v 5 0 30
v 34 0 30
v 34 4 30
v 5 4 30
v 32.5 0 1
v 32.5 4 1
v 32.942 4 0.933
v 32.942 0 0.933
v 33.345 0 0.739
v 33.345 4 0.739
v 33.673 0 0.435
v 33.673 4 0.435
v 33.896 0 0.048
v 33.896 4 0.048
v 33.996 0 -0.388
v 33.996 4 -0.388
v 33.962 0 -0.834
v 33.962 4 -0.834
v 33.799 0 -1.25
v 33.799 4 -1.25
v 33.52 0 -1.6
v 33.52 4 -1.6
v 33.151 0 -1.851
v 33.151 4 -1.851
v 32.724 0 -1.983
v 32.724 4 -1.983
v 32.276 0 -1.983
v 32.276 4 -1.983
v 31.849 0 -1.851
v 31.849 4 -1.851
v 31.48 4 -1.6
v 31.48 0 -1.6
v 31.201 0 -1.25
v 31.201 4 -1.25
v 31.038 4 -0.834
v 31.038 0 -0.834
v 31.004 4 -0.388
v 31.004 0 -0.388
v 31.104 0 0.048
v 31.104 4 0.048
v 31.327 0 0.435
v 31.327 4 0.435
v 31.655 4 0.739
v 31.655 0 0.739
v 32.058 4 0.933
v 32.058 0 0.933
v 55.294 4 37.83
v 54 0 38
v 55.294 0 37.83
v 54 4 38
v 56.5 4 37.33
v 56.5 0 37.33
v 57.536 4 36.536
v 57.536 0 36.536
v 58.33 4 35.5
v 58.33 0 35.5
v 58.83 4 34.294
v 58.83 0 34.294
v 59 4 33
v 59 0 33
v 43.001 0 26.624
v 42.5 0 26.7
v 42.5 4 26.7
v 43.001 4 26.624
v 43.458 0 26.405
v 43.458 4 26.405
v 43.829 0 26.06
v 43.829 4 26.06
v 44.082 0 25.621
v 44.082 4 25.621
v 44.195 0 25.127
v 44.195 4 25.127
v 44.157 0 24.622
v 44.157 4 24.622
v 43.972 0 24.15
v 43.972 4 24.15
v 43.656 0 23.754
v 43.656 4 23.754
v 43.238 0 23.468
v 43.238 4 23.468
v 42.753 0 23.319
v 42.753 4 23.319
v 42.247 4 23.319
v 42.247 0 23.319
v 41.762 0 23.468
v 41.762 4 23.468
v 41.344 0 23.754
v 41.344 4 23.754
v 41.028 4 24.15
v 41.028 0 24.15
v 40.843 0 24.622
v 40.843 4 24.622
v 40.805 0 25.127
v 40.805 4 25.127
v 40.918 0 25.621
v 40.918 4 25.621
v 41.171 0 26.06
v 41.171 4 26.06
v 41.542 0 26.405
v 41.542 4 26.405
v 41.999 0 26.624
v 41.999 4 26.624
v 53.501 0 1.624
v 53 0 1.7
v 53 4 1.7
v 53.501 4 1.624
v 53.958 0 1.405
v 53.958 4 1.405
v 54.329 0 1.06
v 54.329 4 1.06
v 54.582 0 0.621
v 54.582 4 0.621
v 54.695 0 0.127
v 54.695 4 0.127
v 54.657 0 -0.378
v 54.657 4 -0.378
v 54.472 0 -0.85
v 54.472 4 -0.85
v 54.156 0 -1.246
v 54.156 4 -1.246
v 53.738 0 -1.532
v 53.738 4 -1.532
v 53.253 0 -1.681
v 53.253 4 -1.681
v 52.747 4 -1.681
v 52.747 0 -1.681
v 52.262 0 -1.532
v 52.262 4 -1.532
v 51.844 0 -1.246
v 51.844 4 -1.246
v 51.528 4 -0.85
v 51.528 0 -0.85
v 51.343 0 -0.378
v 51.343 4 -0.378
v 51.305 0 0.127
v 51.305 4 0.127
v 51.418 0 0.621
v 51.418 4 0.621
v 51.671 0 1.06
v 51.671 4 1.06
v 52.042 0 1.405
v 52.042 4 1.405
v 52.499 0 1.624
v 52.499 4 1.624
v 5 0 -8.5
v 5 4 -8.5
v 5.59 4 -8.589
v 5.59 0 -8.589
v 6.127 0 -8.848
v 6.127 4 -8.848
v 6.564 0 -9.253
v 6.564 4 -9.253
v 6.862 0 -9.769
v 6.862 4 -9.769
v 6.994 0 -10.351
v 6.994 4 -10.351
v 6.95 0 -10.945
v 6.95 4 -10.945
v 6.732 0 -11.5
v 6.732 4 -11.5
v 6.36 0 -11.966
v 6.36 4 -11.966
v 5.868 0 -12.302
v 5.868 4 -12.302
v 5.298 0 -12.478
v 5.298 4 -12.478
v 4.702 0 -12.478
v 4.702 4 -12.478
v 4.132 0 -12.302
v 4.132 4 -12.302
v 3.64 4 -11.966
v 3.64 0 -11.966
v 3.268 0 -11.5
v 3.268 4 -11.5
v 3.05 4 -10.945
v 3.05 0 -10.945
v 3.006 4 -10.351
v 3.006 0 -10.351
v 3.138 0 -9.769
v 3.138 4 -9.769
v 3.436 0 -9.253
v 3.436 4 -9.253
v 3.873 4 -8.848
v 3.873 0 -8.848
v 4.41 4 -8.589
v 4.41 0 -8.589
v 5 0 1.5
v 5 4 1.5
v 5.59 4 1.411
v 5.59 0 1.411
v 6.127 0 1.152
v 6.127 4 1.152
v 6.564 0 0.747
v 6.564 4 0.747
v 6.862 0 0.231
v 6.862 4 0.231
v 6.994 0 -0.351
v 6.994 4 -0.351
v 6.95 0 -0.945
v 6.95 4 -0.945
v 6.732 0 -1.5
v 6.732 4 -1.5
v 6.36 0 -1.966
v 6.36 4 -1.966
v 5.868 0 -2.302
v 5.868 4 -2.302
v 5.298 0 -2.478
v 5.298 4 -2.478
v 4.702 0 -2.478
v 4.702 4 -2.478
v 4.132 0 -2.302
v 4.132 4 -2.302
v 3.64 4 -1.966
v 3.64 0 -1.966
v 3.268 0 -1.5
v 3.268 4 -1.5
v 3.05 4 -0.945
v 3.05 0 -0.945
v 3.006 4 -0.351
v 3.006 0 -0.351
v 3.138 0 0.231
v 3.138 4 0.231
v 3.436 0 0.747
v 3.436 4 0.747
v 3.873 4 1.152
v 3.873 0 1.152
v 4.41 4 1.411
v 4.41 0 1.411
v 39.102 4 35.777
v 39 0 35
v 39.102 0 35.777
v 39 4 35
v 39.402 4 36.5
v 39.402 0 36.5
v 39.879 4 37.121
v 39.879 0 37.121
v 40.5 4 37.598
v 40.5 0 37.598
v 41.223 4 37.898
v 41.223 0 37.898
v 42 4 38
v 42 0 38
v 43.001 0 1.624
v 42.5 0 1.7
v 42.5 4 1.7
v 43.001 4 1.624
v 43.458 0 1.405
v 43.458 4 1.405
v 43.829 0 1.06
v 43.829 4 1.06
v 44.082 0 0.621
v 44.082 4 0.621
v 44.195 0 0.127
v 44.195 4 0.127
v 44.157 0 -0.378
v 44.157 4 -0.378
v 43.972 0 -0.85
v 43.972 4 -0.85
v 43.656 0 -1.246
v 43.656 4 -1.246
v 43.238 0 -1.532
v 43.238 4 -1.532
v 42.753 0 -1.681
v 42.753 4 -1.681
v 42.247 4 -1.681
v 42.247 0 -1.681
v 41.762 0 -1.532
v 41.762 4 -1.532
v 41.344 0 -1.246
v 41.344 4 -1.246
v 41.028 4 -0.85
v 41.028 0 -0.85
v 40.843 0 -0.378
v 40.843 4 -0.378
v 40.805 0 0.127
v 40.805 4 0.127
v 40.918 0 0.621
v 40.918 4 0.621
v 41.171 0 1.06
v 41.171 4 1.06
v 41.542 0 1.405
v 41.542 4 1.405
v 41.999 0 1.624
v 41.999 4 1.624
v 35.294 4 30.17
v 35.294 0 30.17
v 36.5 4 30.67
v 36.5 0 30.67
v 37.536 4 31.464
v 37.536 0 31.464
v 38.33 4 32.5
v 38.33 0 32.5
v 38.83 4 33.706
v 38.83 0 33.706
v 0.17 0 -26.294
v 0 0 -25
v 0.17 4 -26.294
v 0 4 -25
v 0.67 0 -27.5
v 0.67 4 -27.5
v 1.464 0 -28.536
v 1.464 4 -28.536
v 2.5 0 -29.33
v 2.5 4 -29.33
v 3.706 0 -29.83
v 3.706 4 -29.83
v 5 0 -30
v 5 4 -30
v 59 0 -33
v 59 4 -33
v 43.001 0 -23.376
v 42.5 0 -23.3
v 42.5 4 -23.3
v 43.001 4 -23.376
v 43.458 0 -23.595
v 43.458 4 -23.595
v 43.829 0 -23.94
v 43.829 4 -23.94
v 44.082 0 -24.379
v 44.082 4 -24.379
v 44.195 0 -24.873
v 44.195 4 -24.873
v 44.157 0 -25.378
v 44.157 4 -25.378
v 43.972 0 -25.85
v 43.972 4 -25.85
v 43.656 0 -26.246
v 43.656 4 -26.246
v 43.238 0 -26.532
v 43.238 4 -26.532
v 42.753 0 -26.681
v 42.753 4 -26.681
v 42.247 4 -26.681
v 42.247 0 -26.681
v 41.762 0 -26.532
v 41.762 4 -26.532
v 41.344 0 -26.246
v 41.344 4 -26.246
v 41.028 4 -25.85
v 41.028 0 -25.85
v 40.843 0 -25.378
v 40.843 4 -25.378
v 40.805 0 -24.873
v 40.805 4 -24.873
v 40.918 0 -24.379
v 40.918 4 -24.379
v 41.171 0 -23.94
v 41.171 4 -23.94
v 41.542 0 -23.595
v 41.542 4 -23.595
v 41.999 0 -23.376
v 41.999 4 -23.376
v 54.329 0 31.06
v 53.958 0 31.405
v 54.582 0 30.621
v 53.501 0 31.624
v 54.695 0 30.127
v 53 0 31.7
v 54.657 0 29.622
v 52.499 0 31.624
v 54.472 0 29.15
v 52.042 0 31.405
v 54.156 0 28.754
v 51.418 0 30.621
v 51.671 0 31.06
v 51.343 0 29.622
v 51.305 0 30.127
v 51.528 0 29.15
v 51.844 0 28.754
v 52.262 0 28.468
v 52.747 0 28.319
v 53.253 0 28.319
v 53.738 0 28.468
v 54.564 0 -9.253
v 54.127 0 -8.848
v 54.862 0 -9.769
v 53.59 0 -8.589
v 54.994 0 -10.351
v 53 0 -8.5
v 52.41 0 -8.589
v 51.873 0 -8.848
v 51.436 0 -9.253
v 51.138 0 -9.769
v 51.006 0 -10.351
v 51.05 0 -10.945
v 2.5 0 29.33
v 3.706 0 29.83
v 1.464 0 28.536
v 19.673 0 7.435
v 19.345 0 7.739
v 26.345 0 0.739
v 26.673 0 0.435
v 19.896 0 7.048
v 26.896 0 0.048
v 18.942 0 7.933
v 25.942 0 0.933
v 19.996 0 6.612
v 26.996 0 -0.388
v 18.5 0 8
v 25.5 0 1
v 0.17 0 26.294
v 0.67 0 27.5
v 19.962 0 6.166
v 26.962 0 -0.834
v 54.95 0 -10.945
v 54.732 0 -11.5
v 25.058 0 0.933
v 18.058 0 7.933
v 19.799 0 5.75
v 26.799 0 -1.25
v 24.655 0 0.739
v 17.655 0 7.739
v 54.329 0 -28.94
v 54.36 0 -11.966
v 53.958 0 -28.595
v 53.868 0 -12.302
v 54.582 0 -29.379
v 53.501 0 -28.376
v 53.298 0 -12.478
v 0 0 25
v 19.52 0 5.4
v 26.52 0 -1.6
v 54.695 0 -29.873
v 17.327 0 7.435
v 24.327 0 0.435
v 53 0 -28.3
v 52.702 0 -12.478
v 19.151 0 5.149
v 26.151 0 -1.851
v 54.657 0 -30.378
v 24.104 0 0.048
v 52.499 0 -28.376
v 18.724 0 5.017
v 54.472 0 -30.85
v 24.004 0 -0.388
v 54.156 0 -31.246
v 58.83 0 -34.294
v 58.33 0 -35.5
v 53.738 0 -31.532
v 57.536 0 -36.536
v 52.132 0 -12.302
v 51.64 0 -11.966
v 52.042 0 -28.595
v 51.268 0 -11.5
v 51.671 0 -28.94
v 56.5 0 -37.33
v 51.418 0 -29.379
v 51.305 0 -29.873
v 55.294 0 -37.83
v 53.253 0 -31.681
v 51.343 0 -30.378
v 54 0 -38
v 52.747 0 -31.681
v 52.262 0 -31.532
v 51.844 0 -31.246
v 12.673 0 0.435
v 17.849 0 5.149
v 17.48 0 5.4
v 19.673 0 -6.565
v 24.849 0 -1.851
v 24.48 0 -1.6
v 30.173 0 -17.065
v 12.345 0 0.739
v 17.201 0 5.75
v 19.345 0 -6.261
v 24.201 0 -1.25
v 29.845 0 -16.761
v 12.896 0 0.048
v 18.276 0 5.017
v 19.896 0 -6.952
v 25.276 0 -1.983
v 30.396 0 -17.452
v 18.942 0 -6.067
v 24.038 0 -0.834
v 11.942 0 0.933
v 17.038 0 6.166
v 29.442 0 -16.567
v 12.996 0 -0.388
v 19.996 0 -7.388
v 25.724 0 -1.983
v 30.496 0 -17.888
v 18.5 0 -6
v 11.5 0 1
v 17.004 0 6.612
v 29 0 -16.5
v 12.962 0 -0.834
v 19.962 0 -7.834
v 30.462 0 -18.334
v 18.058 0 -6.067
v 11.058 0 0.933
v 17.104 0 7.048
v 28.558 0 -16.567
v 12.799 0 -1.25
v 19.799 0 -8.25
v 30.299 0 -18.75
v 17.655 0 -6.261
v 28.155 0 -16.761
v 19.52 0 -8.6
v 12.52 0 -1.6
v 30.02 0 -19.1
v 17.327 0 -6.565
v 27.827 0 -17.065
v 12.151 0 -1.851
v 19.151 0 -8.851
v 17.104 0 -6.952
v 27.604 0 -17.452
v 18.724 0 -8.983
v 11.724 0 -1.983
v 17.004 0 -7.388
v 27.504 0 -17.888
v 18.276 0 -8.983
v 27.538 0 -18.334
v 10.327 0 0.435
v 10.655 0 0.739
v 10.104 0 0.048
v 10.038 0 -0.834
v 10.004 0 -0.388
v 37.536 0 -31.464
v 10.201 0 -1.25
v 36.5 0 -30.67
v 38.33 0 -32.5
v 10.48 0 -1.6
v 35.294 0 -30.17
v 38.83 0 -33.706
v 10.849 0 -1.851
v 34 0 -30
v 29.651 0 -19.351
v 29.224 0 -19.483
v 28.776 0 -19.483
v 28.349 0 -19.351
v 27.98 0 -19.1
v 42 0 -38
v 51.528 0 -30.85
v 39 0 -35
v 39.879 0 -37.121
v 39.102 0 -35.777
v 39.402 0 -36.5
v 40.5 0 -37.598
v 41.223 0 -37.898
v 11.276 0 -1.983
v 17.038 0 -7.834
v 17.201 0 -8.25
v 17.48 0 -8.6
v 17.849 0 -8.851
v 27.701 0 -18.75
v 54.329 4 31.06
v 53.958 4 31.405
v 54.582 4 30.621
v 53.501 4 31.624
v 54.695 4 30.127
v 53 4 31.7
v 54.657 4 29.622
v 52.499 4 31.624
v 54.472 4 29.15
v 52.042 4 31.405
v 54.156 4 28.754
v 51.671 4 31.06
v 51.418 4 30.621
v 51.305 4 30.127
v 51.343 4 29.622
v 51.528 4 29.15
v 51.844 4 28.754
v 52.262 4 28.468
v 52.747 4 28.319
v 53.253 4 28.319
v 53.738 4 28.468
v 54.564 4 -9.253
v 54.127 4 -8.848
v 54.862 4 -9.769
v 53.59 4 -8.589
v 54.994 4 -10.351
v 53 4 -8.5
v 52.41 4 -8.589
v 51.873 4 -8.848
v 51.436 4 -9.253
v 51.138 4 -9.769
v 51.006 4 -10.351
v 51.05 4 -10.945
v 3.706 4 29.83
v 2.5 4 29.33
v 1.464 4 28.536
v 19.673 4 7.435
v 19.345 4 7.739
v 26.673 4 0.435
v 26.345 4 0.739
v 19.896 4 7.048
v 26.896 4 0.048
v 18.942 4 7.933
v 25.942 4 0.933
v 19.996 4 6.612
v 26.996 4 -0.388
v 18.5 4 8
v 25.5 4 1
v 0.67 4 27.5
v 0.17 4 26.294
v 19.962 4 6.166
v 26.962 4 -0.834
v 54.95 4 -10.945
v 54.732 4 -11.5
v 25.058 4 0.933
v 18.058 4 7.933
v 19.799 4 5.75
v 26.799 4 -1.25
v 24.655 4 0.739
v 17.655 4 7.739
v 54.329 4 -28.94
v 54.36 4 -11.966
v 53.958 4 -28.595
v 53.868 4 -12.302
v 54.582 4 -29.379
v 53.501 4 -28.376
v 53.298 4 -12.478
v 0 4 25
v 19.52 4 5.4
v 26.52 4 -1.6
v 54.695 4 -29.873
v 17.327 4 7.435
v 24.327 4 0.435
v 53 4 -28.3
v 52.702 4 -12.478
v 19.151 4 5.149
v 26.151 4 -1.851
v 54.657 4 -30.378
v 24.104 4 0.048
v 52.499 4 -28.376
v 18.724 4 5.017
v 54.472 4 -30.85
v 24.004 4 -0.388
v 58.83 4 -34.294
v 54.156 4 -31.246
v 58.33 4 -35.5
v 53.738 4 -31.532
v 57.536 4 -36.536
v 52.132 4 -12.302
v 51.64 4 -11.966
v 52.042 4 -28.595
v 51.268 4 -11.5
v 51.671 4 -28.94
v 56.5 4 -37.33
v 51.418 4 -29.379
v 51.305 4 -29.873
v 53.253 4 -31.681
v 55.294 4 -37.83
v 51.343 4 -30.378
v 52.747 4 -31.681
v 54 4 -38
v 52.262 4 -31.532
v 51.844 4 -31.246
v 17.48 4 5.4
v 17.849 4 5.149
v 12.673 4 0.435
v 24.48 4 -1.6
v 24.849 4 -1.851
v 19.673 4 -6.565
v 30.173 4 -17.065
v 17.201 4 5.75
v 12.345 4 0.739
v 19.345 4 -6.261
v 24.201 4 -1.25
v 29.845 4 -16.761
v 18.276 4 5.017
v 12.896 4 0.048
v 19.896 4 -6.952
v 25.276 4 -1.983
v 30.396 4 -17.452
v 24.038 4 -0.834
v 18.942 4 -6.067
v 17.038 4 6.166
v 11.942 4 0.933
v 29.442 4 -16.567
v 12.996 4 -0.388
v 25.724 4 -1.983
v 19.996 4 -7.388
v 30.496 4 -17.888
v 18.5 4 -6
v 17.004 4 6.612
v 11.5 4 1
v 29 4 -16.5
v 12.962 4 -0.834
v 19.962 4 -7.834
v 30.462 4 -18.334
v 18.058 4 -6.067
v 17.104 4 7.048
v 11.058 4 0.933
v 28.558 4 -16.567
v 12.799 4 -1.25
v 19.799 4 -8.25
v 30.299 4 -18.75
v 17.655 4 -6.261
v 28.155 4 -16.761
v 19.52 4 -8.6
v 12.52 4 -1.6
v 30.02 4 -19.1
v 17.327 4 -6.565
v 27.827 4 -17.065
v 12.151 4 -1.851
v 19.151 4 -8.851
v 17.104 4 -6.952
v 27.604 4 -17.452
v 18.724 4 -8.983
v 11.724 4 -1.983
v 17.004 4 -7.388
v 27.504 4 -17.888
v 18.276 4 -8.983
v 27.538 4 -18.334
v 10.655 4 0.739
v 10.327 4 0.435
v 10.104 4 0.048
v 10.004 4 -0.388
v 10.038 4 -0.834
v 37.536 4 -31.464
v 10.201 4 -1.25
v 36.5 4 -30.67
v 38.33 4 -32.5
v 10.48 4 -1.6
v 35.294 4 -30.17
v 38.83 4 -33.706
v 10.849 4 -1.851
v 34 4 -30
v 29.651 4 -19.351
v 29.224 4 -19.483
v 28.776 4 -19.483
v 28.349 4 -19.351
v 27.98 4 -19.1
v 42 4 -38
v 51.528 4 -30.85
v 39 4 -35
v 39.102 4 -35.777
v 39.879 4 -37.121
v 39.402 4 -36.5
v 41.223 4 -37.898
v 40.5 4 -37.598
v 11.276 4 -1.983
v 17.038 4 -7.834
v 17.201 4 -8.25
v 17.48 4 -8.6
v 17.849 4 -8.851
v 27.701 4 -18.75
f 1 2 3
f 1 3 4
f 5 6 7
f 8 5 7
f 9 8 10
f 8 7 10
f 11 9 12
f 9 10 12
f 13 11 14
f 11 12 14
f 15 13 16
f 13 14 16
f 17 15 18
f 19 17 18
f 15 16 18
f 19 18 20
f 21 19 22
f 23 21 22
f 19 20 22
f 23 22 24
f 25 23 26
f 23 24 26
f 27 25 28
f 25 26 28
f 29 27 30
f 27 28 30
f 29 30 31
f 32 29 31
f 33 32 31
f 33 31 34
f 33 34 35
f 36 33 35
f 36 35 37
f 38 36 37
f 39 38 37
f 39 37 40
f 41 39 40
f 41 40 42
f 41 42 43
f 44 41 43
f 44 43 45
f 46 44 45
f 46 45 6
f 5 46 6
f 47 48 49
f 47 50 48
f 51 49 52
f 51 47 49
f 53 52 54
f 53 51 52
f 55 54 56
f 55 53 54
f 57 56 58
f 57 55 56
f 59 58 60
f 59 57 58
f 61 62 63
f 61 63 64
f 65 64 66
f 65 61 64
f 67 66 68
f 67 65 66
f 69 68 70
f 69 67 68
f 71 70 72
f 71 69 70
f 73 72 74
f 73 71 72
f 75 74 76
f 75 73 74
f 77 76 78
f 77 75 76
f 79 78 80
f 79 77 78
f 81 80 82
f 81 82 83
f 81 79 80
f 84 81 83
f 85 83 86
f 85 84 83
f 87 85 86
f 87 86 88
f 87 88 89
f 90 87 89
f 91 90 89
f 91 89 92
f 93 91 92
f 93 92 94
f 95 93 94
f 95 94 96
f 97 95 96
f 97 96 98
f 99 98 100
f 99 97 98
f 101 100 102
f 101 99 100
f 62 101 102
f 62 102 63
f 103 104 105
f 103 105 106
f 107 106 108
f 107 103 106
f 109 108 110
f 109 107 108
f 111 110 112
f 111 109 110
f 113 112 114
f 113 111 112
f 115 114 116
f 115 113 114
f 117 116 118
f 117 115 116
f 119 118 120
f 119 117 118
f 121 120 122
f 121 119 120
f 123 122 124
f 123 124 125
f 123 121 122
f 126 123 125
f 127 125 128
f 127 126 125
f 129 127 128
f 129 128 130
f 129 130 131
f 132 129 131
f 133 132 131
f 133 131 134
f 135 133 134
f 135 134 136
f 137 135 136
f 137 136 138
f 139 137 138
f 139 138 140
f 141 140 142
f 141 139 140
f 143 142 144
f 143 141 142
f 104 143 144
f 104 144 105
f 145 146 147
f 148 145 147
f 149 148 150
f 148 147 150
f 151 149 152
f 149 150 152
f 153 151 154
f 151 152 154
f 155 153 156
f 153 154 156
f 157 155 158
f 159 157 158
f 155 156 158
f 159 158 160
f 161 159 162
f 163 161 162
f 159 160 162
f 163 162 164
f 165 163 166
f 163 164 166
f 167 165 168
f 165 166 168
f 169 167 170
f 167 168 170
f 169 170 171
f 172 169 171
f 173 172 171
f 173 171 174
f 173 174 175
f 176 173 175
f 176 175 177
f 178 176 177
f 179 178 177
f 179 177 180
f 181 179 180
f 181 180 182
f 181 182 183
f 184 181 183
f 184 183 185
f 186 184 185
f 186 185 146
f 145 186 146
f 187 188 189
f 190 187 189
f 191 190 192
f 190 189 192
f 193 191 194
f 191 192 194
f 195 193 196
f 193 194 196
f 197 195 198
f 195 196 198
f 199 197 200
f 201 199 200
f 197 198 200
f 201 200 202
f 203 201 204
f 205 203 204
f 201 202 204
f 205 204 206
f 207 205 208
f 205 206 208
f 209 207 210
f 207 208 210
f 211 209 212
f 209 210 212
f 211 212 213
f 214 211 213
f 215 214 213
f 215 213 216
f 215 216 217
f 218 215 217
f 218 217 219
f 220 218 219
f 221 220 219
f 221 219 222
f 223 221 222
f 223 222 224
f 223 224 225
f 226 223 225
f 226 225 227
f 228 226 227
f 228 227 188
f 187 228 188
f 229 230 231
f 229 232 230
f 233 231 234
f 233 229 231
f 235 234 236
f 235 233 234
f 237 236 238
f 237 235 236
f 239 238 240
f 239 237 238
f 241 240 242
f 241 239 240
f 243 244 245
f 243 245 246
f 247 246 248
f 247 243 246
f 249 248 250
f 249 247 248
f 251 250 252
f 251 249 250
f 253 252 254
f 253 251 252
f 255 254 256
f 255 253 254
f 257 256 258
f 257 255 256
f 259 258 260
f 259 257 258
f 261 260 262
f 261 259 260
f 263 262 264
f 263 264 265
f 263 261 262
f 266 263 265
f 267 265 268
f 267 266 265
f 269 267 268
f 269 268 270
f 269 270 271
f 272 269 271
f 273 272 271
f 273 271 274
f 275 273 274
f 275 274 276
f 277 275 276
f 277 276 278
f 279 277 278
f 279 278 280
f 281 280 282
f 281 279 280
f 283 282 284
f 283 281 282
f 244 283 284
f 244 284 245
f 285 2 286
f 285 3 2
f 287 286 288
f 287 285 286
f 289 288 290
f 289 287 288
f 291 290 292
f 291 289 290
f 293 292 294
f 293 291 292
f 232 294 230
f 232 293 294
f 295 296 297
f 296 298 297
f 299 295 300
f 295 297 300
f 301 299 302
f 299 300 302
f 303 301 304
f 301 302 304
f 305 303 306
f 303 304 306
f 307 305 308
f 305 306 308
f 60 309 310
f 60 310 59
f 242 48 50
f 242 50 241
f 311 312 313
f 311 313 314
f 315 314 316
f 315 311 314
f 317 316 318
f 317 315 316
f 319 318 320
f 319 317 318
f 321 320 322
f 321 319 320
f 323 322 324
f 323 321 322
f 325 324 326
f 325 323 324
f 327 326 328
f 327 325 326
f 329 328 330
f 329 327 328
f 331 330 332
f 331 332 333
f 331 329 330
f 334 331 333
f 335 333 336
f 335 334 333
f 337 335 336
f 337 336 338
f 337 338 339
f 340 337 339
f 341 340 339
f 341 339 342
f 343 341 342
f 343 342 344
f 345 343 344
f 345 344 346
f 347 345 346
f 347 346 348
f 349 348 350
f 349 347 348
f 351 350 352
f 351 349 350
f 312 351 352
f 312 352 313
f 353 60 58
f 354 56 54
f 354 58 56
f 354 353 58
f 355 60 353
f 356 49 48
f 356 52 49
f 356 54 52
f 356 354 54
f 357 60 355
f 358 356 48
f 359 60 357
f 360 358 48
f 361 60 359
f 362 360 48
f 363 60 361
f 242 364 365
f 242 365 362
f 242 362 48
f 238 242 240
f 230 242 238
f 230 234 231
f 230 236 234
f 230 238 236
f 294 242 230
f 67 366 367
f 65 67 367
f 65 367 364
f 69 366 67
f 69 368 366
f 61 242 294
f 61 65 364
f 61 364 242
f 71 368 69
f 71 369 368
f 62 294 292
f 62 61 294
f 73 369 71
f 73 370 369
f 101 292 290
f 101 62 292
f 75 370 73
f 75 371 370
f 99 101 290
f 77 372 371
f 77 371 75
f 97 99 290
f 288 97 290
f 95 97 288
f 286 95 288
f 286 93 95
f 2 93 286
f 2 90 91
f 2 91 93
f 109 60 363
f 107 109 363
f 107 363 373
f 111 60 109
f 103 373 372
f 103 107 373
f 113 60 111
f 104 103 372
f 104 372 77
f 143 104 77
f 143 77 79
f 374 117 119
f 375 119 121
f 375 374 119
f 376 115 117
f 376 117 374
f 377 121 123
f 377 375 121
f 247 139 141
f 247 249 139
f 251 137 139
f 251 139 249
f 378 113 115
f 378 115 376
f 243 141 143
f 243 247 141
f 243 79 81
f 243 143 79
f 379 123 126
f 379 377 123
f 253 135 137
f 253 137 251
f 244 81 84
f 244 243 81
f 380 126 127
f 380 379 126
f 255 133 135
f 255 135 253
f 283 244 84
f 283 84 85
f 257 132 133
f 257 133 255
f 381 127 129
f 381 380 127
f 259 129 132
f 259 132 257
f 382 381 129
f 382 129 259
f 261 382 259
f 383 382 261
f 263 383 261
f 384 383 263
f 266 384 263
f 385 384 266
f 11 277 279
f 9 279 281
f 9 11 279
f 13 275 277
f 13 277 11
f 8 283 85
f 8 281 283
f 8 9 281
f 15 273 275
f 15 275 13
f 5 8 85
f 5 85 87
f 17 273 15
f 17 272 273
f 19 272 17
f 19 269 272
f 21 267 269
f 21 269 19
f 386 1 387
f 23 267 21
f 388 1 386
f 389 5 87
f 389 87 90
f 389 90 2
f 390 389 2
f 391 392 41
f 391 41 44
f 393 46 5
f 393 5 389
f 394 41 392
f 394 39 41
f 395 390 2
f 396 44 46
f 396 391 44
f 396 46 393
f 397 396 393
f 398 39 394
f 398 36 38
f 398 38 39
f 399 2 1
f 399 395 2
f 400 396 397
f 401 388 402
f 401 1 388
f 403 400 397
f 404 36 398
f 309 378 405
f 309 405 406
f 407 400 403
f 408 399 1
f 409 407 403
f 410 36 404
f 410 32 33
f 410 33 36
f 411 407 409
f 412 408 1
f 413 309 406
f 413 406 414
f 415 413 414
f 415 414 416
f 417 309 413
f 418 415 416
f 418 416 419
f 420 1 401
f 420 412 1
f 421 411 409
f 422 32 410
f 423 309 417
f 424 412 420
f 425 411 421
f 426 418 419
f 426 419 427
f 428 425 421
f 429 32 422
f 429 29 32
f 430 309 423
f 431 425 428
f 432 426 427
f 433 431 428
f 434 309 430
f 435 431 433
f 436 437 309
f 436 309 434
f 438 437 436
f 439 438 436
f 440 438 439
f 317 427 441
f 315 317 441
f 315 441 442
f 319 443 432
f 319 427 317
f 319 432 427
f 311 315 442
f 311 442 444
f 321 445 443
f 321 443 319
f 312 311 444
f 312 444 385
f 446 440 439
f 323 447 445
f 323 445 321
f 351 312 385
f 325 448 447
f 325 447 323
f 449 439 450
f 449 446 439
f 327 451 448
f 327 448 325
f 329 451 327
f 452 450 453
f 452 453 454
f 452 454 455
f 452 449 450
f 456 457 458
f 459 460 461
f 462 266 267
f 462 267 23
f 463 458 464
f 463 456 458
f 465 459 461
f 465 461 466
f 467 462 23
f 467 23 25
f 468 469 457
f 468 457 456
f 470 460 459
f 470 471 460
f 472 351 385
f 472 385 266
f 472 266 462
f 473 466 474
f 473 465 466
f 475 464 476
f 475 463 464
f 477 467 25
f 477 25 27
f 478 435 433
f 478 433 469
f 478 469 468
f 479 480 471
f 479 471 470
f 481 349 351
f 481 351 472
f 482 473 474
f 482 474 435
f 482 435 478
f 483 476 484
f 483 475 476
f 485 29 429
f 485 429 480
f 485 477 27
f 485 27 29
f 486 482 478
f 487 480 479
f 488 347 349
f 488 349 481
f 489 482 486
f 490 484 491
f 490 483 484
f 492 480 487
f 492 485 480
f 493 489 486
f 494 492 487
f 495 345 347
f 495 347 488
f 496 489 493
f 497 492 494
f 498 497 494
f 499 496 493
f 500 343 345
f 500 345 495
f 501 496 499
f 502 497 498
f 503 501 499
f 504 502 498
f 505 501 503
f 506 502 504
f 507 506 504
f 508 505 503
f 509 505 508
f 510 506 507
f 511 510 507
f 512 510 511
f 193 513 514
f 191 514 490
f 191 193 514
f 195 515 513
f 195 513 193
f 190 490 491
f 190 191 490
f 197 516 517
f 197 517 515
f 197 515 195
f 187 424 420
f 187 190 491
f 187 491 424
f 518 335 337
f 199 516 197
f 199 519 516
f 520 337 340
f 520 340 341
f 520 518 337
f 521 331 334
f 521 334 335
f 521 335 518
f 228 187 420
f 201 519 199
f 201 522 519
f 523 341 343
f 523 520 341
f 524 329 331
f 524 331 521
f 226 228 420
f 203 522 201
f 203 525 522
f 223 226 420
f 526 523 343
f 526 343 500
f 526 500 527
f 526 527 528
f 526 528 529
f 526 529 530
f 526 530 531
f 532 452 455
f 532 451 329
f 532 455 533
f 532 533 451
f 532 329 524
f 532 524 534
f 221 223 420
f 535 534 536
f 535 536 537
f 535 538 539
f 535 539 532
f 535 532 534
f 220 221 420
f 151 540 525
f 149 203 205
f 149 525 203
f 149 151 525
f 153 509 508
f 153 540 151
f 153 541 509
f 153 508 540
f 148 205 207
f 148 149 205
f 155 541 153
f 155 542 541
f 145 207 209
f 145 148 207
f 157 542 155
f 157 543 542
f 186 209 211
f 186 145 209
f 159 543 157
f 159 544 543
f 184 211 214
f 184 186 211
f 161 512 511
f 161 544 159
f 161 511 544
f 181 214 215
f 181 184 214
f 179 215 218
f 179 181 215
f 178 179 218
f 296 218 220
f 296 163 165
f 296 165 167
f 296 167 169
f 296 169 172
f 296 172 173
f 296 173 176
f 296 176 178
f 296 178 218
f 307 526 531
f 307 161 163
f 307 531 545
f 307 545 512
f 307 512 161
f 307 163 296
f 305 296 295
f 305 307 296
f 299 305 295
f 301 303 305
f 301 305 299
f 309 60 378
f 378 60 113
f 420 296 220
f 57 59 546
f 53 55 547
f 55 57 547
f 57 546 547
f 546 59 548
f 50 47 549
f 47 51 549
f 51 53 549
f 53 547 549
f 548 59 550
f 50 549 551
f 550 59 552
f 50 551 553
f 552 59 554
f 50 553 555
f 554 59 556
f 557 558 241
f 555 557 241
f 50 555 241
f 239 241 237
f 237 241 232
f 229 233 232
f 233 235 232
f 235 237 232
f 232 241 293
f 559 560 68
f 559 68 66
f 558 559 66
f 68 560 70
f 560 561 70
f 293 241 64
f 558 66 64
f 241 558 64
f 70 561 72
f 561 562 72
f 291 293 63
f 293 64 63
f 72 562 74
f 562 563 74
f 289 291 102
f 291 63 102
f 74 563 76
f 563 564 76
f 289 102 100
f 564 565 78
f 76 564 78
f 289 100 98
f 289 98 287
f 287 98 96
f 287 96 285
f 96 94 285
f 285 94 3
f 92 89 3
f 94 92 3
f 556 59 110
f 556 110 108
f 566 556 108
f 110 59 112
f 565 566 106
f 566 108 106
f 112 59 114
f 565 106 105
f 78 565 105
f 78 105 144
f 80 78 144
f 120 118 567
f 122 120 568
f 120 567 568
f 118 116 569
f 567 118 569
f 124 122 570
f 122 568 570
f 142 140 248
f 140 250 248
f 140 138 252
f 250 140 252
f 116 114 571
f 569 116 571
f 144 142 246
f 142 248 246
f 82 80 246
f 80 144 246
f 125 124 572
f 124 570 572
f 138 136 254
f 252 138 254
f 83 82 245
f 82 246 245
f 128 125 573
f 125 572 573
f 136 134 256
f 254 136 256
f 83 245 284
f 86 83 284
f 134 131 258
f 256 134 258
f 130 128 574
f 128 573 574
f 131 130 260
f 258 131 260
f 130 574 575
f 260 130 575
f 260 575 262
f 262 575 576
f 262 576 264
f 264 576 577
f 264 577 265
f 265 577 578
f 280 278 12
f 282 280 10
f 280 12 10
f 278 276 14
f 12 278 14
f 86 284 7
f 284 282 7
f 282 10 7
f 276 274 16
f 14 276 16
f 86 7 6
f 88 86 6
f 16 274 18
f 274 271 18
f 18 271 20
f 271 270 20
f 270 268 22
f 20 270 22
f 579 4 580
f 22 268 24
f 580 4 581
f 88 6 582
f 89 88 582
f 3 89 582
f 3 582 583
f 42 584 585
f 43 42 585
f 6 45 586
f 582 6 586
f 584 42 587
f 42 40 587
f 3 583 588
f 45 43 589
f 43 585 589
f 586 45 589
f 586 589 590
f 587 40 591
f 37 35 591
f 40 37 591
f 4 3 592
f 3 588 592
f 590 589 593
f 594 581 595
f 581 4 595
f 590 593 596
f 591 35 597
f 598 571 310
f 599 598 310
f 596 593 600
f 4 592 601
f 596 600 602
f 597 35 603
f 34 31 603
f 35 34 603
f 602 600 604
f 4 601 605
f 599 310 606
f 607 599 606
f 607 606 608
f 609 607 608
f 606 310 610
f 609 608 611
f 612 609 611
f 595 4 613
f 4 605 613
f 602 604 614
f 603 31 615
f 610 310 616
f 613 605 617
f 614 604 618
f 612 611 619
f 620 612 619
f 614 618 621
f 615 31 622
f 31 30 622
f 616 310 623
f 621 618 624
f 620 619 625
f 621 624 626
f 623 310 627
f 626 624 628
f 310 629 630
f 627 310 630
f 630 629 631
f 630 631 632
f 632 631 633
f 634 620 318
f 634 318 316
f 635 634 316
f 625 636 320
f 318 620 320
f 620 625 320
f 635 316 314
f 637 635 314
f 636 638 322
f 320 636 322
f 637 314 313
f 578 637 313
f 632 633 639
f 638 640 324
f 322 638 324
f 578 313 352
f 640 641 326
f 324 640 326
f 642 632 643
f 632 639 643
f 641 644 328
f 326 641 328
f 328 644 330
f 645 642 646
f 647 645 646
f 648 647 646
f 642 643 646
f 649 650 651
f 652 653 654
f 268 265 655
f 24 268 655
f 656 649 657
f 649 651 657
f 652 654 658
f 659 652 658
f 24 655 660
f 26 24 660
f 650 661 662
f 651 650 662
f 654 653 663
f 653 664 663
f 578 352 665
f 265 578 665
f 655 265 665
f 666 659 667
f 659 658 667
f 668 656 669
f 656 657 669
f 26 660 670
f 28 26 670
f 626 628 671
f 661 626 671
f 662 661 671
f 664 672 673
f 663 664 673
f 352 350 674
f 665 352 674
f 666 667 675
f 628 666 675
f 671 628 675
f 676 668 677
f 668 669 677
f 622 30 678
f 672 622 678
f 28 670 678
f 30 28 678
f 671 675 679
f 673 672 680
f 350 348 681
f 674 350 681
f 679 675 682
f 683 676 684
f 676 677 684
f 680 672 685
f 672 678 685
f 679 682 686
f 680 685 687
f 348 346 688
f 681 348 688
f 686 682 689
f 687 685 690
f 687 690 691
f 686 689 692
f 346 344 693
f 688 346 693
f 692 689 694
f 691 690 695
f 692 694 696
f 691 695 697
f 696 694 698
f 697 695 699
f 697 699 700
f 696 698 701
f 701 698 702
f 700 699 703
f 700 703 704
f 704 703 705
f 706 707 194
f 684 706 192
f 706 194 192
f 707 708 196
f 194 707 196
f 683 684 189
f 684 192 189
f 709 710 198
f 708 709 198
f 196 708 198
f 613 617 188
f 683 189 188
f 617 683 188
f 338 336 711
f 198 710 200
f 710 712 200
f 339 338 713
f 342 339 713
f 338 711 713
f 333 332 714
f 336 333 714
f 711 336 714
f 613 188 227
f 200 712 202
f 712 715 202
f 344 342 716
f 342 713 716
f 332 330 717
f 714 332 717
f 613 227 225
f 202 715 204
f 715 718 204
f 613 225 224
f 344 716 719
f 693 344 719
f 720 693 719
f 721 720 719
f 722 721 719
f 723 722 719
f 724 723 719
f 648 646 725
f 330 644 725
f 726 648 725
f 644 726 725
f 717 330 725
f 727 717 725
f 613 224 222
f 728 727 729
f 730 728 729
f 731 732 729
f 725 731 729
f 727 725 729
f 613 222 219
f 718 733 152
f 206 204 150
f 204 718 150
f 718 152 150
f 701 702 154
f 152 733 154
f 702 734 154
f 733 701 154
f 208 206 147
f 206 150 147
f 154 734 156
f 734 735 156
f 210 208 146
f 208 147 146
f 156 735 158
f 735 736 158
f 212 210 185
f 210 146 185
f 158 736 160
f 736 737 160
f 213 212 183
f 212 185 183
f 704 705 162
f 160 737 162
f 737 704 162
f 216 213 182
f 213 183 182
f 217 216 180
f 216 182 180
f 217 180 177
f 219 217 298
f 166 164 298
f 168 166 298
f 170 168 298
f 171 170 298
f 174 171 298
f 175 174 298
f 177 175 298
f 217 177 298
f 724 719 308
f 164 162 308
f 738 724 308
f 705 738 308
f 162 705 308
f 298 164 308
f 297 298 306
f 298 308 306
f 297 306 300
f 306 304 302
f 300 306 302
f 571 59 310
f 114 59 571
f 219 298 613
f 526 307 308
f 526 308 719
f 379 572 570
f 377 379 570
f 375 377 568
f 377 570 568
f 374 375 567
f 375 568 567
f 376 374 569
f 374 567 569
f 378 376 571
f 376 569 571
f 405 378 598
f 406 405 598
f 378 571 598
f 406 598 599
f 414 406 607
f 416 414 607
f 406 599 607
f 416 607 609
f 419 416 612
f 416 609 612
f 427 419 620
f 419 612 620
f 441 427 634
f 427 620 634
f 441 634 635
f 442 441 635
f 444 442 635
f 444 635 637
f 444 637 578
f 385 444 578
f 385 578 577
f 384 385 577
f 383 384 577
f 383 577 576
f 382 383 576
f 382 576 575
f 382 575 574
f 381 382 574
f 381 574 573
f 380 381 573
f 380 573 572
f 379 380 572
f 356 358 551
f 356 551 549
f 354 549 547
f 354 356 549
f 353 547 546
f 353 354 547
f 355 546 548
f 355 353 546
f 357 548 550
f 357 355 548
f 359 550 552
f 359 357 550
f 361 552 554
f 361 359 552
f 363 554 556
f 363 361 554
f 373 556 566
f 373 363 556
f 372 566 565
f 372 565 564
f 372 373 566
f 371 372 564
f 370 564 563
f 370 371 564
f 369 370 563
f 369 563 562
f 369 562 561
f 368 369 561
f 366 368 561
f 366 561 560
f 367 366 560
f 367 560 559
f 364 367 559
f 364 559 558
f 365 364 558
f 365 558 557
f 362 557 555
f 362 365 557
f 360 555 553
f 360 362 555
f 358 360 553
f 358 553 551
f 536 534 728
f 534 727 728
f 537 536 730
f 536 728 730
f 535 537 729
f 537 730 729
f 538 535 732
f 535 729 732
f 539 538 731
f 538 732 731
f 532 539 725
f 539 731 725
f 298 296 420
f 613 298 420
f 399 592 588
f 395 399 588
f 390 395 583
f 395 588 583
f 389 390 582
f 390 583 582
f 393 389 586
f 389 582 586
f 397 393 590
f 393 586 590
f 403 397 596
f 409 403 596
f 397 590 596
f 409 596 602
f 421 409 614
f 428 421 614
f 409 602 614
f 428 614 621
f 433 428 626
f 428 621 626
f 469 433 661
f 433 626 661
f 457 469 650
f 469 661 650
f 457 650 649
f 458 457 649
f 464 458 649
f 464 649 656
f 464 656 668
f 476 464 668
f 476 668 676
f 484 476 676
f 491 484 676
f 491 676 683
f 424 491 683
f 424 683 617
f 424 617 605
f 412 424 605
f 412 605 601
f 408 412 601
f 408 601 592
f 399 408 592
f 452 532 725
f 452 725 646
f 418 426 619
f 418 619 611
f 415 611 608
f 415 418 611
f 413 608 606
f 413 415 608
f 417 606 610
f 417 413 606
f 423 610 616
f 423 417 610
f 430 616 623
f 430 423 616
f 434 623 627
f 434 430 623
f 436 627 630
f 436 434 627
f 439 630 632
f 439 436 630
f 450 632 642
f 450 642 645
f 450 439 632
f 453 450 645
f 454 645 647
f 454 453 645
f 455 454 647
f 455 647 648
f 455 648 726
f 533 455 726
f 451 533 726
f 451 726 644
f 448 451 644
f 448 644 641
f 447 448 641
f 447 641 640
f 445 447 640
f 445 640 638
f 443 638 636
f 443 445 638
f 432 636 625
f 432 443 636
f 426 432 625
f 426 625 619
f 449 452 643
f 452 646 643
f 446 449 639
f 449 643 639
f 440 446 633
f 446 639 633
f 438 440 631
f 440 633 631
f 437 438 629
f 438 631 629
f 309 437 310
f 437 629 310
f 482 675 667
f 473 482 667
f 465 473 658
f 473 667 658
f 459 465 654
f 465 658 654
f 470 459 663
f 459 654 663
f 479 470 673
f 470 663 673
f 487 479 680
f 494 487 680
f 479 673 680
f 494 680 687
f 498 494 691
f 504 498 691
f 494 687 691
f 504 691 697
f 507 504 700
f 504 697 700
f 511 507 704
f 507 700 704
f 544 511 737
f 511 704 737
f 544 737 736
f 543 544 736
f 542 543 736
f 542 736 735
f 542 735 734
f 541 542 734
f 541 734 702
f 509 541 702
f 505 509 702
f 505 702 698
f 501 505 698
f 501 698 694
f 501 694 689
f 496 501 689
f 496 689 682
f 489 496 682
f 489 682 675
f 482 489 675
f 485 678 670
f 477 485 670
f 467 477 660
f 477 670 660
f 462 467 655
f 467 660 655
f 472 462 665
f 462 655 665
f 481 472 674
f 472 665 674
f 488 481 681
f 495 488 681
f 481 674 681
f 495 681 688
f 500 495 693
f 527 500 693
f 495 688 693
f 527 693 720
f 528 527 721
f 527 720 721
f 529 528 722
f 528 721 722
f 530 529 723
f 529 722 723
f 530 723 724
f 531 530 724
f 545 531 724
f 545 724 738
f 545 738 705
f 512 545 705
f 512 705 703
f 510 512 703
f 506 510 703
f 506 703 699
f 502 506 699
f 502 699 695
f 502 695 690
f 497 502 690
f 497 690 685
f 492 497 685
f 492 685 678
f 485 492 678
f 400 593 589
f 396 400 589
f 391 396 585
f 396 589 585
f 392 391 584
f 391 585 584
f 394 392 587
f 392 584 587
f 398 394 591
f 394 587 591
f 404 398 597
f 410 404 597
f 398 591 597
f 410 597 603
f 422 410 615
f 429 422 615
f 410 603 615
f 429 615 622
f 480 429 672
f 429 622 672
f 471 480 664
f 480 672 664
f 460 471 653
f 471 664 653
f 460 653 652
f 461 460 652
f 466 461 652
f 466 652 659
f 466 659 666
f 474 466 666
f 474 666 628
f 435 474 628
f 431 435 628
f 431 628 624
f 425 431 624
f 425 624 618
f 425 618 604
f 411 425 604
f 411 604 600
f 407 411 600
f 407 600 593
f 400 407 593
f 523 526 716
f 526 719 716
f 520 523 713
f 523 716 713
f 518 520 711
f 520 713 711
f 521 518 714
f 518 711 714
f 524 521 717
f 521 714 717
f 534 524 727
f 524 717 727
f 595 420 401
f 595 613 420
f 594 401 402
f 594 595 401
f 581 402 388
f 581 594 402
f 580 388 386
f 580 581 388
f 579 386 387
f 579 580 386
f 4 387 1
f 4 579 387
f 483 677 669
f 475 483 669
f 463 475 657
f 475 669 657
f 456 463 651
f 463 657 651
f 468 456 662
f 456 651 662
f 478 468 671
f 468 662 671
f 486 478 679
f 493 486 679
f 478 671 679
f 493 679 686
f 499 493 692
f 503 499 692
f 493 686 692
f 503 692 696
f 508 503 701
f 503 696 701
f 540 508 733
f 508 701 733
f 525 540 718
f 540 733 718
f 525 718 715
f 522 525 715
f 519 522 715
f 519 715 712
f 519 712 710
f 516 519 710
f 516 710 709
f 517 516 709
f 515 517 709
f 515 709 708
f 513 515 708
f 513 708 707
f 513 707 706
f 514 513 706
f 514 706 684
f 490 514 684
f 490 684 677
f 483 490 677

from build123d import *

# Parameters (mm, degrees)
SKETCH_1_R          = 1.7
EXTRUDE_1_DEPTH     = 4
SKETCH_2_R          = 1.5
SKETCH_2_R_2        = 2
CUT_EXTRUDE_1_DEPTH = 71.292247083
FILLET_1_R          = 5
FILLET_2_R          = 3


with BuildPart() as part:
    # 草图1 → 凸台-拉伸1 (new body)
    with BuildSketch(Plane(origin=(0, 0, 0), x_dir=(1, 0, 0), z_dir=(0, 1, 0))):
        Polygon((0, 0), (0, 30), (39, 30), (39, 38), (59, 38), (59, -38), (39, -38), (39, -30), (0, -30), align=None)
        with Locations(Location((42.5, 25, 0), (0, 0, 270))):
            Circle(SKETCH_1_R, mode=Mode.SUBTRACT)
        with Locations(Location((42.5, -25, 0), (0, 0, 270))):
            Circle(SKETCH_1_R, mode=Mode.SUBTRACT)
        with Locations(Location((42.5, 0, 0), (0, 0, 270))):
            Circle(SKETCH_1_R, mode=Mode.SUBTRACT)
        with Locations(Location((53, 30, 0), (0, 0, 270))):
            Circle(SKETCH_1_R, mode=Mode.SUBTRACT)
        with Locations(Location((53, 0, 0), (0, 0, 270))):
            Circle(SKETCH_1_R, mode=Mode.SUBTRACT)
        with Locations(Location((53, -30, 0), (0, 0, 270))):
            Circle(SKETCH_1_R, mode=Mode.SUBTRACT)
    extrude(amount=EXTRUDE_1_DEPTH)

    # 草图2 → 切除-拉伸1 (cut, through all)
    with BuildSketch(Plane(origin=(0, 4, 0), x_dir=(1, 0, 0), z_dir=(0, 1, 0))):
        with Locations(Location((32.5, 0.5, 0), (0, 0, 270))):
            Circle(SKETCH_2_R)
        with Locations(Location((5, 0.5, 0), (0, 0, 270))):
            Circle(SKETCH_2_R_2)
        with Locations(Location((5, 10.5, 0), (0, 0, 270))):
            Circle(SKETCH_2_R_2)
        with Locations(Location((53, 10.5, 0), (0, 0, 270))):
            Circle(SKETCH_2_R_2)
        with Locations(Location((29, 18, 0), (0, 0, 270))):
            Circle(SKETCH_2_R)
        with Locations(Location((18.5, -6.5, 0), (0, 0, 270))):
            Circle(SKETCH_2_R)
        with Locations(Location((11.5, 0.5, 0), (0, 0, 270))):
            Circle(SKETCH_2_R)
        with Locations(Location((25.5, 0.5, 0), (0, 0, 270))):
            Circle(SKETCH_2_R)
        with Locations(Location((18.5, 7.5, 0), (0, 0, 270))):
            Circle(SKETCH_2_R)
    extrude(amount=-CUT_EXTRUDE_1_DEPTH, mode=Mode.SUBTRACT)

    # 圆角1
    fillet_1_edges = [part.edges().sort_by_distance(p)[0] for p in [
        (59, 2, 38),
        (39, 2, 30),
        (0, 2, 30),
        (0, 2, -30),
        (39, 2, -30),
        (59, 2, -38),
    ]]
    fillet(fillet_1_edges, radius=FILLET_1_R)

    # 圆角2
    fillet_2_edges = [part.edges().sort_by_distance(p)[0] for p in [
        (39, 2, 38),
        (39, 2, -38),
    ]]
    fillet(fillet_2_edges, radius=FILLET_2_R - 0.0001)  # a hair under: the kernel refuses the full size


solid = part.part
